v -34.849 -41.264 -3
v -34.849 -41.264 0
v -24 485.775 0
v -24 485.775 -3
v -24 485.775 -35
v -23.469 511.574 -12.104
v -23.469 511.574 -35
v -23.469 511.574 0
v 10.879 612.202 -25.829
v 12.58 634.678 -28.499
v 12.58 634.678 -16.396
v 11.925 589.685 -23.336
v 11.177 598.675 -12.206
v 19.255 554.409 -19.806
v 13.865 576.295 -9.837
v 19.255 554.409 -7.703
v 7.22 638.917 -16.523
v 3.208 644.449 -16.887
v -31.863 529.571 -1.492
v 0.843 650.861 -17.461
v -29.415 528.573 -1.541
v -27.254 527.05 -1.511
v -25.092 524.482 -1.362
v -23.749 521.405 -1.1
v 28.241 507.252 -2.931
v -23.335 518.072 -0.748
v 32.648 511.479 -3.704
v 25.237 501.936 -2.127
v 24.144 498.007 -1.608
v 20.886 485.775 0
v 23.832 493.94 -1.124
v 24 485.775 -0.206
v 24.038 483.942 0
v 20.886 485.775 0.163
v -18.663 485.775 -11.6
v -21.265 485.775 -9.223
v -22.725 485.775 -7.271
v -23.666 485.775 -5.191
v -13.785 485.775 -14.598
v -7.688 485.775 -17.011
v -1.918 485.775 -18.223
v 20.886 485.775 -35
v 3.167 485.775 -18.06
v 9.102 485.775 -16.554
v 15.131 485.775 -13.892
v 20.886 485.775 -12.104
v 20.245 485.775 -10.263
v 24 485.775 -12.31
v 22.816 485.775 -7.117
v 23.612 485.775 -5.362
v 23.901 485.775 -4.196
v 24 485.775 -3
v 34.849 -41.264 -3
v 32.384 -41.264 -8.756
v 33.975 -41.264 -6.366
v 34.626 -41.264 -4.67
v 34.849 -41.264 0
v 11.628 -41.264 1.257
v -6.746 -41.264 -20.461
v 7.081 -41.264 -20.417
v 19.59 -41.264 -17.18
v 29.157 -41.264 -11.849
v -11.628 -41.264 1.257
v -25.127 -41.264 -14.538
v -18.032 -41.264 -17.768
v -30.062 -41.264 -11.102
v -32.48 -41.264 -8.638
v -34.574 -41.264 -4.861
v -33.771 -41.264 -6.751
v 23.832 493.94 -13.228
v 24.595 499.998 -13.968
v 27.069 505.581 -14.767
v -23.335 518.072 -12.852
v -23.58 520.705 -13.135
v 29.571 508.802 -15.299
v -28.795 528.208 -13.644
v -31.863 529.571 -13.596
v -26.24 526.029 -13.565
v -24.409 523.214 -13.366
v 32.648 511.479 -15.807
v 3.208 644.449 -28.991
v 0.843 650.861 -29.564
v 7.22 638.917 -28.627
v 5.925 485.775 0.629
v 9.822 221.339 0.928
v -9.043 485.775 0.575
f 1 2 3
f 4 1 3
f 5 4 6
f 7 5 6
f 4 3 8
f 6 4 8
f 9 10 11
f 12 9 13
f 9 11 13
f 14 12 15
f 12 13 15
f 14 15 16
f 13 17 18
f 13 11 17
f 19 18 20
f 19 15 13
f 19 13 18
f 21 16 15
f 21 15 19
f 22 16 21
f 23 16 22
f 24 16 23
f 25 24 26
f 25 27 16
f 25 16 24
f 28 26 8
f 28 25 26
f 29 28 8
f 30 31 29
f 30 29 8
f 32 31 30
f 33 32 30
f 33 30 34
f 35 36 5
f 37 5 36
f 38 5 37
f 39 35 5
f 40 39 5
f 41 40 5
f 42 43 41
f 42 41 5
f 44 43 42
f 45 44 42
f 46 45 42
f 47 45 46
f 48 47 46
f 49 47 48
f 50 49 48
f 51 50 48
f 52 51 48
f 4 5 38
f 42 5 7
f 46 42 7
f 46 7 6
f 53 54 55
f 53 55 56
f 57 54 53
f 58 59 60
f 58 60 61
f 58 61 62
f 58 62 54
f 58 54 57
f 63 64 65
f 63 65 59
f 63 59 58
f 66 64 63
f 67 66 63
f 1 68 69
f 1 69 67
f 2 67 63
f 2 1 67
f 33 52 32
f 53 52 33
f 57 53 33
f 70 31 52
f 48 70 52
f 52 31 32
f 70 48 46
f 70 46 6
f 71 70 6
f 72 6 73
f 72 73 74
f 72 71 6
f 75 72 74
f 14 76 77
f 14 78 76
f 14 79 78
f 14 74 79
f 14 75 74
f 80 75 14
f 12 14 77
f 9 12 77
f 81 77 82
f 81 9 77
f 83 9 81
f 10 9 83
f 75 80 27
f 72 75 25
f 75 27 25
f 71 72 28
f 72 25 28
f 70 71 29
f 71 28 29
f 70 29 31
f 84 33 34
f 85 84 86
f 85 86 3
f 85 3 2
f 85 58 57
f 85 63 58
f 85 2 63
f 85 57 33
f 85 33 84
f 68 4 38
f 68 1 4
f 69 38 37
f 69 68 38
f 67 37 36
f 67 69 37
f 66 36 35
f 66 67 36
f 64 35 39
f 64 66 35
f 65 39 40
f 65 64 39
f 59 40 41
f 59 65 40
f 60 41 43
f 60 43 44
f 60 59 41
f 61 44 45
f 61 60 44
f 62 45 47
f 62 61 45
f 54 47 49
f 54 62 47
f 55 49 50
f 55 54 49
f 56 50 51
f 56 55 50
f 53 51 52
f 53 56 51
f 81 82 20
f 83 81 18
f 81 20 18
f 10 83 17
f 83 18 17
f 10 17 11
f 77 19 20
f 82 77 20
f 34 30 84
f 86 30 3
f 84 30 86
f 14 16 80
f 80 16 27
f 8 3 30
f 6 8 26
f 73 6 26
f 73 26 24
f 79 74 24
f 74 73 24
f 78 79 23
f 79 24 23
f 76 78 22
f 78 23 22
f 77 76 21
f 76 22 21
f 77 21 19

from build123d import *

# Parameters (mm, degrees)
F17_W          = 64.5110210379
F17_H          = 35
F18_DEPTH      = 165.0861956251
F21_DEPTH      = 300.8879553896
F21_DEPTH_BACK = 107.3482027968
F23_DEPTH      = 35.0010001


# Not quite as in the source:
# - ends of sketch curves that miss each other by under 0.0002 mm in the source are joined


with BuildPart() as f16:
    # F12 (on plane+point) → F16 section 0
    with BuildSketch(Plane.XZ.offset(-485.775)):
        with BuildLine():
            Line((24, -3), (24, 0))
            ThreePointArc((24, 0), (0, 0.6702898704), (-24, 0))
            Line((-24, 0), (-24, -3))
            add(Edge.make_bspline(
                [(0, -18.3297101296), (-8.1108585, -18.3297101296), (-24, -11.7364646867), (-24, -3)],
                knots=[0, 0, 0, 0, 28.4780619541, 28.4780619541, 28.4780619541, 28.4780619541], degree=3))
            add(Edge.make_bspline(
                [(0, -18.3297101296), (8.1108585, -18.3297101296), (24, -11.7364646867), (24, -3)],
                knots=[0, 0, 0, 0, 28.4780619541, 28.4780619541, 28.4780619541, 28.4780619541], degree=3))
        make_face()
    # F15 (on plane+point) → F16 section 1
    with BuildSketch(Plane.XZ.offset(41.2637528239)):
        with BuildLine():
            Line((34.849441672, -3), (34.849441672, 0))
            ThreePointArc((34.849441672, 0), (-4.636e-07, 1.414516756), (-34.849441672, 0))
            Line((-34.849441672, 0), (-34.849441672, -3))
            add(Edge.make_bspline(
                [(0, -20.8934800247), (-18.3918643743, -20.8934800247), (-34.849441672, -11.1013991282), (-34.849441672, -3)],
                knots=[0, 0, 0, 0, 39.1747394662, 39.1747394662, 39.1747394662, 39.1747394662], degree=3))
            add(Edge.make_bspline(
                [(0, -20.8934800247), (18.3918643743, -20.8934800247), (34.849441672, -11.1013991282), (34.849441672, -3)],
                knots=[0, 0, 0, 0, 39.1747394662, 39.1747394662, 39.1747394662, 39.1747394662], degree=3))
        make_face()
    loft()

    # F17 (on plane+point) → F18 (join, through all)
    with BuildSketch(Plane.XZ.offset(-485.775)):
        with Locations((0.3923069216, -17.5)):
            Rectangle(F17_W, F17_H)
    extrude(amount=-F18_DEPTH)

    # F20 (on line) → F21 (cut, two sides)
    with BuildSketch(Plane(origin=(-216.1177251342, 125.7026275723, 0), x_dir=(-0.5027782463, -0.8644154297, 0), z_dir=(-0.8644154297, 0.5027782463, 0))) as f21_sk:
        Polygon((-579.0290724854, -19.5657188317), (-430.4126832009, 0), (-430.4126832009, 11.4312007947), (-603.4596902493, 11.4312007947), (-603.4596902493, -22.782070678), align=None)
        Polygon((-577.4627581787, -31.4630571682), (-579.0290724854, -19.5657188317), (-603.4596902493, -22.782070678), (-603.4596902493, -42.47670056), (-430.4126832009, -42.47670056), (-430.4126832009, -12.103547527), align=None)
    extrude(amount=-F21_DEPTH, mode=Mode.SUBTRACT)
    extrude(f21_sk.sketch, amount=F21_DEPTH_BACK, mode=Mode.SUBTRACT)

    # F22 (on Top) → F23 (cut, through all)
    with BuildSketch(Plane.XY):
        with BuildLine():
            Line((-24, 485.775), (-23.4689132846, 511.5738649171))
            Line((-23.4689132846, 511.5738649171), (-23.3351348237, 518.0724881039))
            ThreePointArc((-23.3351348237, 518.0724881039), (-25.6339997847, 525.2791071894), (-31.8632035974, 529.5706289024))
            Line((-31.8632035974, 529.5706289024), (0.8434898226, 650.8611956251))
            ThreePointArc((0.8434898226, 650.8611956251), (5.0240250103, 641.5455786867), (12.5804428166, 634.6783999841))
            ThreePointArc((12.5804428166, 634.6783999841), (11.496048805, 594.1758564179), (19.2548236248, 554.408616647))
            Line((19.2548236248, 554.408616647), (32.6478174405, 511.4794017912))
            ThreePointArc((32.6478174405, 511.4794017912), (26.0643094519, 503.8032110141), (23.8319180476, 493.9400010445))
            Line((23.8319180476, 493.9400010445), (24.0377310644, 483.9421192188))
            Line((24.0377310644, 483.9421192188), (47.9396730661, 474.6490120888))
            Line((47.9396730661, 474.6490120888), (47.9396730661, 656.2497676849))
            Line((47.9396730661, 656.2497676849), (-50.3920817524, 656.2497676849))
            Line((-50.3920817524, 656.2497676849), (-50.3920817524, 480.0127209663))
            Line((-50.3920817524, 480.0127209663), (-24, 485.775))
        make_face()
    extrude(amount=-F23_DEPTH, mode=Mode.SUBTRACT)


solid = f16.part
